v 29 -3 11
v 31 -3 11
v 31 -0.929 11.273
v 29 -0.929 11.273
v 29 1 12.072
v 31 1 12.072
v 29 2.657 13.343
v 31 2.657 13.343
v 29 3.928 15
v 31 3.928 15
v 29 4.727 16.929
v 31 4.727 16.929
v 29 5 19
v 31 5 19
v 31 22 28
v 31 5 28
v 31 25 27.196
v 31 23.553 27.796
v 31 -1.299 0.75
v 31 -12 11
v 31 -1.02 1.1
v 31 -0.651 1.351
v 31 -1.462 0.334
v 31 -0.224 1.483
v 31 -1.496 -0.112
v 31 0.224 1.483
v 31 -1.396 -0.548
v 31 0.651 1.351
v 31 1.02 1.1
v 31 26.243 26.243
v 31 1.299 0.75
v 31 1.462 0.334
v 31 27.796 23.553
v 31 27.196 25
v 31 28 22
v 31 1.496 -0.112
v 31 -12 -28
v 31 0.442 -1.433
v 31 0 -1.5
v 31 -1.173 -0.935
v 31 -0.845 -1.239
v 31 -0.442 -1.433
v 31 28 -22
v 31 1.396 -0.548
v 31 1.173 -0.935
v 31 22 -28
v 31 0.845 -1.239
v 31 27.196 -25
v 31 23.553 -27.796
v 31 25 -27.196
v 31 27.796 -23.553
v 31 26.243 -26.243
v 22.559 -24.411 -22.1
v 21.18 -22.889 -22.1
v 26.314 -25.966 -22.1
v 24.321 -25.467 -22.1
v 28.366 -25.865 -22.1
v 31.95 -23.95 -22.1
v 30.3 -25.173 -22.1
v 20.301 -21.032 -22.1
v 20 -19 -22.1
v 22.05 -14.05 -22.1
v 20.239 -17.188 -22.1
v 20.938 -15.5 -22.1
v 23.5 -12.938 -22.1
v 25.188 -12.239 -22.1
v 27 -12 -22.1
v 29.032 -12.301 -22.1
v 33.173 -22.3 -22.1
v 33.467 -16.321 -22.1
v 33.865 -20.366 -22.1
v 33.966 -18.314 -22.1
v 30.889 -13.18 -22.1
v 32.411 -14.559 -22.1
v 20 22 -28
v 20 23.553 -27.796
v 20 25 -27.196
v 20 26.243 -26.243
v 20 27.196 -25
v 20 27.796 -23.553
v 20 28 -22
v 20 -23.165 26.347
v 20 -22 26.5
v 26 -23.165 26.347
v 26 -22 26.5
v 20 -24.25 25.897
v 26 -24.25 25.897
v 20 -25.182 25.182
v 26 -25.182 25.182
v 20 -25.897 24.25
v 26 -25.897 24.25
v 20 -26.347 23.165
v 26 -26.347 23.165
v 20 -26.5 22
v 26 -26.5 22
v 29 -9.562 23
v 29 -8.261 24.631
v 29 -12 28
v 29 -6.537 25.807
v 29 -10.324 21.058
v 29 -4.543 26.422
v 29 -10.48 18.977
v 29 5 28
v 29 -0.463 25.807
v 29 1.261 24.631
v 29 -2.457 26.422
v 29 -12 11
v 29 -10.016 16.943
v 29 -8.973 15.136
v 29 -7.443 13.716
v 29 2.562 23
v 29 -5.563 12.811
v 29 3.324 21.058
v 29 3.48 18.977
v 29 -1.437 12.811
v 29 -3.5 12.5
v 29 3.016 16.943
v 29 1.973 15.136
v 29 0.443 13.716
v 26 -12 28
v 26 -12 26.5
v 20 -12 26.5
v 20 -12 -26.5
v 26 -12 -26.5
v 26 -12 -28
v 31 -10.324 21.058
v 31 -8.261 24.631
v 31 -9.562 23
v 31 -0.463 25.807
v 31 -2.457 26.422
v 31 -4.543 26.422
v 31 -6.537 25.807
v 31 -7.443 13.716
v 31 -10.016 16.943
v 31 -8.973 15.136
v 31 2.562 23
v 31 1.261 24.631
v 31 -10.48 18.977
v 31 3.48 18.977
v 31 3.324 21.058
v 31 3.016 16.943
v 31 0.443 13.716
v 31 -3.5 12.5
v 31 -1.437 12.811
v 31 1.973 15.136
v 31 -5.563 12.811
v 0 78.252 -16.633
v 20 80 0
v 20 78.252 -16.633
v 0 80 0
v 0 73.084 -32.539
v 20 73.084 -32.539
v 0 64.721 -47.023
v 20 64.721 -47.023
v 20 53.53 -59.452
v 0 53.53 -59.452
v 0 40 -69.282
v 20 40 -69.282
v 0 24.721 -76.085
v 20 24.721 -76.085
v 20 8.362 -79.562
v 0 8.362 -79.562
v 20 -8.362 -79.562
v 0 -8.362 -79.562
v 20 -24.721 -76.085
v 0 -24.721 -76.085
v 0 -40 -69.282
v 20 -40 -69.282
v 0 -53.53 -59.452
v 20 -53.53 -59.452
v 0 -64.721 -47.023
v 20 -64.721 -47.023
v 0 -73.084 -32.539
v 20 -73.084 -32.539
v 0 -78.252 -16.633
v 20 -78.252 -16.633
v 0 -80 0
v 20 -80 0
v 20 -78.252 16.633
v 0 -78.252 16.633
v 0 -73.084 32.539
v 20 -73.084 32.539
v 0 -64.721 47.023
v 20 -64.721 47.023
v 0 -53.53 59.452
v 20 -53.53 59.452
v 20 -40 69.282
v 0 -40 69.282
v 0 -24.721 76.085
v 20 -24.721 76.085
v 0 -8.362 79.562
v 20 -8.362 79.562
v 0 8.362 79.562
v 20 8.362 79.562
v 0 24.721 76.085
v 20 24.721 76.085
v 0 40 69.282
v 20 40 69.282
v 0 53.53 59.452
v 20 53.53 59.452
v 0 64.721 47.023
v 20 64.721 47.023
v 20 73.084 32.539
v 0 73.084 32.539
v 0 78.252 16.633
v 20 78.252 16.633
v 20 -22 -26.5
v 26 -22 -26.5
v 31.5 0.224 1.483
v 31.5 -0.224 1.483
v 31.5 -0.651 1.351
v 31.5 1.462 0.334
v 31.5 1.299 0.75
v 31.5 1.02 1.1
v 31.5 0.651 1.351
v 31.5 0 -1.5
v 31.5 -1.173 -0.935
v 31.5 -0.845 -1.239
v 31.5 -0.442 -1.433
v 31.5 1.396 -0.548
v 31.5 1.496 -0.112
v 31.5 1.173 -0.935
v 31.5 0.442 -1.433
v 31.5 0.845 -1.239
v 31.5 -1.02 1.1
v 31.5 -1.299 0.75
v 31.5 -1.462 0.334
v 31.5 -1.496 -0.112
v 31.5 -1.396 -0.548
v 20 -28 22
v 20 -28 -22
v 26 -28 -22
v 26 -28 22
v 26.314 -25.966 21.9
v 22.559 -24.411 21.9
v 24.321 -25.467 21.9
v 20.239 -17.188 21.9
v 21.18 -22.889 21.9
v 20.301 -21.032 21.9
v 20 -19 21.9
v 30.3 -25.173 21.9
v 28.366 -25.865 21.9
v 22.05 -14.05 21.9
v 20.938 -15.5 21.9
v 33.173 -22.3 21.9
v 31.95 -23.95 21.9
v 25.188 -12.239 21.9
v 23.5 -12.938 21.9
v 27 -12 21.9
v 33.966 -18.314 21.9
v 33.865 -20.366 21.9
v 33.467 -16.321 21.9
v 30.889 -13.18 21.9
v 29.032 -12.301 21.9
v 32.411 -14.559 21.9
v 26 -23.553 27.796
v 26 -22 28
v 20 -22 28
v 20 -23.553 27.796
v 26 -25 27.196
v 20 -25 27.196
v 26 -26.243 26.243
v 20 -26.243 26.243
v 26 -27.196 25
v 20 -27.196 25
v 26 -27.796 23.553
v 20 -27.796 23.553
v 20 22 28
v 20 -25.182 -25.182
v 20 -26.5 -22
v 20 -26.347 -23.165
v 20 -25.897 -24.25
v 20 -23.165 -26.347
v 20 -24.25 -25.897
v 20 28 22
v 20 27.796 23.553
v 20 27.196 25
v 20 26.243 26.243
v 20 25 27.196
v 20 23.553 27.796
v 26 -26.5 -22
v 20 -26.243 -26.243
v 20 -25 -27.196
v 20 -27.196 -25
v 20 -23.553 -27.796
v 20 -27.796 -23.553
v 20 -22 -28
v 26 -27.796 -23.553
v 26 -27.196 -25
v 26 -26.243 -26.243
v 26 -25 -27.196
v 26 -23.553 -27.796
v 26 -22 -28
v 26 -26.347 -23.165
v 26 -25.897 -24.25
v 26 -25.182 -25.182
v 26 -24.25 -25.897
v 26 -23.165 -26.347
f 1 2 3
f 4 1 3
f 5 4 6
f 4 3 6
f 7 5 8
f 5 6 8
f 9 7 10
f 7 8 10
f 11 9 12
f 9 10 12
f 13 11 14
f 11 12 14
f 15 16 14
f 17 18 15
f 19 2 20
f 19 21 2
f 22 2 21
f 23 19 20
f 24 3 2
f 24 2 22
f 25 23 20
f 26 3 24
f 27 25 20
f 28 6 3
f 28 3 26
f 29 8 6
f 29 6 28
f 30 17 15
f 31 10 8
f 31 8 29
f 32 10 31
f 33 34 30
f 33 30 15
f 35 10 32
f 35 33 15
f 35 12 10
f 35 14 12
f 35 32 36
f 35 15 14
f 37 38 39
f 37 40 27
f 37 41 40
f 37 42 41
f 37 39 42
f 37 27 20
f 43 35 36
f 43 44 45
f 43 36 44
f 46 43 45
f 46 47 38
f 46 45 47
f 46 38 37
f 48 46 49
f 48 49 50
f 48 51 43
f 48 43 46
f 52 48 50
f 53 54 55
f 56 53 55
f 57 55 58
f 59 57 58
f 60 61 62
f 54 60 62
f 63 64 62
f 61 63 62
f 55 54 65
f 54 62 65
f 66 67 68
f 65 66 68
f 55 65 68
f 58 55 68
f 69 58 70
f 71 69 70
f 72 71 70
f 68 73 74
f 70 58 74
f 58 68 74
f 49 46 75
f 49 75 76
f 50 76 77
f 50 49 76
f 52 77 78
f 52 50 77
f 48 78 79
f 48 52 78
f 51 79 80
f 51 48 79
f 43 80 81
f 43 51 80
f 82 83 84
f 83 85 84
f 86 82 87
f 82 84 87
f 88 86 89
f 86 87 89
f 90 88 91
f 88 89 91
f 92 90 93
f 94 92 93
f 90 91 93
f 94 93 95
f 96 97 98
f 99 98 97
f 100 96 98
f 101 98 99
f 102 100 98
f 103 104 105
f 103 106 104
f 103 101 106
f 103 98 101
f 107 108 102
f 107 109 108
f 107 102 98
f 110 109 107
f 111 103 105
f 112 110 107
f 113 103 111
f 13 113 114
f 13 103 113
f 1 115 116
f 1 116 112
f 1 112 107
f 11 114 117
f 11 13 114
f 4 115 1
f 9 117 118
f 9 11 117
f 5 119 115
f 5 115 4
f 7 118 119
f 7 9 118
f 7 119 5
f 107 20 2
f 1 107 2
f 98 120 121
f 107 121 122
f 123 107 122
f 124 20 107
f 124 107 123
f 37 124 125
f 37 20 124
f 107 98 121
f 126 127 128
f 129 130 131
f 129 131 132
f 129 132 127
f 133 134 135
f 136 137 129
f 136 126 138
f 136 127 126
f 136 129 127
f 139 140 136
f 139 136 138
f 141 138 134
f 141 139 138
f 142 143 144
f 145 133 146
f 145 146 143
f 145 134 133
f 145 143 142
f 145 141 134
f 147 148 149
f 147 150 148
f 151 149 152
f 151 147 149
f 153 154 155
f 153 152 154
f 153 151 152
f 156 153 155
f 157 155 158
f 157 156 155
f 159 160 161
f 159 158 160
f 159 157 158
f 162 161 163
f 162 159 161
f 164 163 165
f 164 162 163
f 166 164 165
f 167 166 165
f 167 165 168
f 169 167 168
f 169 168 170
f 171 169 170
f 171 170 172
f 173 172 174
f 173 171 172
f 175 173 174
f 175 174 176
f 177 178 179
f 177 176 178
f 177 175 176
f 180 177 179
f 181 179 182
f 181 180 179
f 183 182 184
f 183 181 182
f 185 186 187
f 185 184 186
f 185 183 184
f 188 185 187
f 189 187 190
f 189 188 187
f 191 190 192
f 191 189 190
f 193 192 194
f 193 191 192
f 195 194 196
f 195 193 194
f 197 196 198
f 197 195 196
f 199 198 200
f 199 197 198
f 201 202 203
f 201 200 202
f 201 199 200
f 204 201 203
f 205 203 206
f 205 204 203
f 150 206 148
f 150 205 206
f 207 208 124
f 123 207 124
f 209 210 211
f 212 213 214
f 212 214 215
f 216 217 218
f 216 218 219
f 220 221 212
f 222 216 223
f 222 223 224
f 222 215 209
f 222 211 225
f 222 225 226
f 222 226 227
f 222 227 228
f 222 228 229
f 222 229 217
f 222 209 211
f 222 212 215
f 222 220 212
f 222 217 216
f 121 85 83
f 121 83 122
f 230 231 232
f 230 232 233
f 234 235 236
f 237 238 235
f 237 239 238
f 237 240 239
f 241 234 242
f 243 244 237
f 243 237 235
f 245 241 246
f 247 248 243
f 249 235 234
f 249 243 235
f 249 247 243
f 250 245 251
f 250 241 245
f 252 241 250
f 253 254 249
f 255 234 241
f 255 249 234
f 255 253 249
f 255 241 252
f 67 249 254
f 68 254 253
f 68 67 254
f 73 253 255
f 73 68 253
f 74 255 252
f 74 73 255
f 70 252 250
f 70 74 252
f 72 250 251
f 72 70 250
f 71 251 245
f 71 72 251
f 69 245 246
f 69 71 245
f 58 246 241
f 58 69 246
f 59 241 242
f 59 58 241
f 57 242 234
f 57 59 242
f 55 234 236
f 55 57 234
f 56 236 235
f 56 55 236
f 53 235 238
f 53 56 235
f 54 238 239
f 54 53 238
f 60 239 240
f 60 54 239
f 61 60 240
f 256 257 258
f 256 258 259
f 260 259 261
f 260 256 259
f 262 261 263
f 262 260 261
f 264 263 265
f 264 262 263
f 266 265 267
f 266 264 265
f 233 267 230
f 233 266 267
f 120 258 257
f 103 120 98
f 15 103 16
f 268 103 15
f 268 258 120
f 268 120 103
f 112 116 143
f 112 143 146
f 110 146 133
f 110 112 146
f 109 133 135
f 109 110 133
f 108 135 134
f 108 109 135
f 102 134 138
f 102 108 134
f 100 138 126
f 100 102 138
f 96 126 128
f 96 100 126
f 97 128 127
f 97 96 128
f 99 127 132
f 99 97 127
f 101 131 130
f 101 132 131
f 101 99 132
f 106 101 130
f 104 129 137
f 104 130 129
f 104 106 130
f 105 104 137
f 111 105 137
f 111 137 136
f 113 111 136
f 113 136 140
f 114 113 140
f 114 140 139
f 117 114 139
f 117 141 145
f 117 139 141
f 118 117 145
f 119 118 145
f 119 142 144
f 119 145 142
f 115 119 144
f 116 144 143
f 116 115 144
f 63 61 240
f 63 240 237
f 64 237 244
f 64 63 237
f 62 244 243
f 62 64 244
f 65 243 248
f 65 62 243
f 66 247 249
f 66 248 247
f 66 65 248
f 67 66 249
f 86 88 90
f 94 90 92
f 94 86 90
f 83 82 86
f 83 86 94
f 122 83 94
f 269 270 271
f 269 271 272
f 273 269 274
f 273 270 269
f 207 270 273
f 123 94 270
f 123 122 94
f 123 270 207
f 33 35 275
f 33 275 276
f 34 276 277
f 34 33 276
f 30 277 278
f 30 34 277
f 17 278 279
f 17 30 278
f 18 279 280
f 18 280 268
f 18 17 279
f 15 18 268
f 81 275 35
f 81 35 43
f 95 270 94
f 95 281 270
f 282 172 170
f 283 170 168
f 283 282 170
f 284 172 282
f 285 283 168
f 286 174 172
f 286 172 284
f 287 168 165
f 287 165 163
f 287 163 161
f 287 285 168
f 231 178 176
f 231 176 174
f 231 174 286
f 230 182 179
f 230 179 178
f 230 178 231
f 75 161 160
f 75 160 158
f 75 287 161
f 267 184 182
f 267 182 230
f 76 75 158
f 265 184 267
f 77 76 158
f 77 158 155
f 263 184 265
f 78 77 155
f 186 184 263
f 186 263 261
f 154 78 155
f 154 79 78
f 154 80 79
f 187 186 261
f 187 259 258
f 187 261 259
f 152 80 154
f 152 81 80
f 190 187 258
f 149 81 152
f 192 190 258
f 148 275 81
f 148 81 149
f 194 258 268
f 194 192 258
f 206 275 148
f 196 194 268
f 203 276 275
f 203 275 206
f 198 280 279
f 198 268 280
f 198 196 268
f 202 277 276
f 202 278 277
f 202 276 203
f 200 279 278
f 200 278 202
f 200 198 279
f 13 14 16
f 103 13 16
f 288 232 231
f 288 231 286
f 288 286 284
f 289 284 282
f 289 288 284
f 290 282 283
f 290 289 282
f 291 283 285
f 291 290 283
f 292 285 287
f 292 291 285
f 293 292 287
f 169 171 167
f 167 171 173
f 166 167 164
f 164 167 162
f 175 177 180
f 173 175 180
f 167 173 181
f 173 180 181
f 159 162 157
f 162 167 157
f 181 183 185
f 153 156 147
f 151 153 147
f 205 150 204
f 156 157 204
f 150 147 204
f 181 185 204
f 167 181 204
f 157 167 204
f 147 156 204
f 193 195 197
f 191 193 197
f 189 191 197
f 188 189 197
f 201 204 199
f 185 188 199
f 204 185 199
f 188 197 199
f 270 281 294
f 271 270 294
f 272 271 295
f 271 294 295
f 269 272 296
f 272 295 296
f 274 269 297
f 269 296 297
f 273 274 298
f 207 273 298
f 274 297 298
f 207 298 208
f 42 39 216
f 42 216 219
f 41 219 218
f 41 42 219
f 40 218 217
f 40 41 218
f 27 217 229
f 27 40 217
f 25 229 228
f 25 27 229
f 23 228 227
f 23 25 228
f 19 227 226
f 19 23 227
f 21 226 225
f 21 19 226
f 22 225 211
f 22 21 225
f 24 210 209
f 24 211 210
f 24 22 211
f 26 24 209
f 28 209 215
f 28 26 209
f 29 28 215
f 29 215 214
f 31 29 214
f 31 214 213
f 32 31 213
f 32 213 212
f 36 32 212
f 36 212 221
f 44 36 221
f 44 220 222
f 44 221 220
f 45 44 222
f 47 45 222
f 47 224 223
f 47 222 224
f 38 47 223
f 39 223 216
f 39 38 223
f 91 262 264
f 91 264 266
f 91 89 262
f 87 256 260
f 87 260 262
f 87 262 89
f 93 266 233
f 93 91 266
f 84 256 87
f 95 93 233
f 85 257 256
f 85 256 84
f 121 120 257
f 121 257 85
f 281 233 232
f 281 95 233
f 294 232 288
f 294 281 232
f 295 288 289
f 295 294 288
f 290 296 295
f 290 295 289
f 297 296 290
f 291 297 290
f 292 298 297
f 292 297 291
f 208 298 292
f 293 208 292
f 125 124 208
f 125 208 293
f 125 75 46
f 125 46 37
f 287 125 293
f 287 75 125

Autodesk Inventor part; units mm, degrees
ref_plane "YZ Plane" through (0, 0, 0) normal (1, 0, 0) x (0, 1, 0)
ref_plane "XZ Plane" through (0, 0, 0) normal (0, 1, 0) x (-1, 0, 0)
ref_plane "XY Plane" through (0, 0, 0) normal (0, 0, 1) x (1, 0, 0)
sketch "スケッチ1" plane through (0, 0, 0) normal (1, 0, 0) x (0, 1, 0)
  circle A0 centre (0, 0) radius 80
  dimension "d0" = 160
extrude "押し出し1" add sketch "スケッチ1" along normal blind 20
sketch "スケッチ2" plane through (20, 0, 0) normal (1, 0, 0) x (0, 0, -1)
  line L0 (28, -28) -> (-28, -28)
  line L1 (-28, -28) -> (-28, 28)
  line L2 (-28, 28) -> (28, 28)
  line L3 (28, 28) -> (28, -28)
  line L4 (28, -28) -> (-28, 28) construction
  line L5 (-28, -28) -> (28, 28) construction
  point P0 (0, 0)
  dimension "d3" = 56
  dimension "d4" = 56
extrude "押し出し2" add sketch "スケッチ2" along normal blind 11
sketch "スケッチ3" plane through (31, 0, 0) normal (1, 0, 0) x (0, 0, -1)
  line L0 (28, 28) -> (-28, 28) projected
  line L1 (-28, 28) -> (-28, -28) projected
  line L2 (-28, -28) -> (28, -28) projected
  line L3 (28, -28) -> (28, 28) projected
  circle A0 centre (-22, 22) radius 6
  line L4 (0, 28) -> (0, -28)
  line L5 (-28, 0) -> (28, 0)
  circle A1 centre (22, 22) radius 6
  circle A2 centre (-22, -22) radius 6
  circle A3 centre (22, -22) radius 6
  point P0 (0, 0)
  point P1 (-22, -28)
  point P2 (-28, -22)
  point P3 (28, -22)
  point P4 (22, -28)
  point P5 (22, 28)
  point P6 (28, 22)
  point P7 (-28, 22)
  point P8 (-22, 28)
  dimension "d7" = 12
extrude "押し出し3" cut sketch "スケッチ3" against normal up to surface (11 mm away) contours L3 A1 L0 | A0 L1 L0 | L3 L2 A3 | L2 L1 A2
sketch "スケッチ4" plane through (31, 0, 0) normal (1, 0, 0) x (0, 0, -1)
  arc A0 (22, -28) -> (28, -22) centre (22, -22) ccw projected
  line L0 (28, -22) -> (28, 22) projected
  arc A1 (28, 22) -> (22, 28) centre (22, 22) ccw projected
  line L1 (22, 28) -> (-22, 28) projected
  arc A2 (-22, 28) -> (-28, 22) centre (-22, 22) ccw projected
  line L2 (-28, 22) -> (-28, -22) projected
  arc A3 (-28, -22) -> (-22, -28) centre (-22, -22) ccw projected
  line L3 (-22, -28) -> (22, -28) projected
  line L4 (-28, -12) -> (28, -12)
  point P0 (0, 0)
  dimension "d10" = 16
extrude "押し出し4" cut sketch "スケッチ4" against normal blind 5 contours L3 A3 L2 L4 L0 A0
sketch "スケッチ5" plane through (26, 0, 0) normal (1, 0, 0) x (0, 0, -1)
  line L0 (28, -12) -> (28, -22) projected
  line L1 (-28, -12) -> (28, -12) projected
  line L2 (-28, -22) -> (-28, -12) projected
  arc A0 (-28, -22) -> (-22, -28) centre (-22, -22) ccw projected
  line L3 (22, -28) -> (-22, -28) projected
  arc A1 (22, -28) -> (28, -22) centre (22, -22) ccw projected
  arc A2 (-26.5, -22) -> (-22, -26.5) centre (-22, -22) ccw
  line L4 (-26.5, -22) -> (-26.5, -13.5)
  line L5 (-26.5, -13.5) -> (26.5, -13.5)
  line L6 (26.5, -13.5) -> (26.5, -22)
  arc A3 (22, -26.5) -> (26.5, -22) centre (22, -22) ccw
  line L7 (22, -26.5) -> (-22, -26.5)
  line L8 (-26.5, -13.5) -> (-26.5, -12)
  line L9 (26.5, -13.5) -> (26.5, -12)
  point P0 (0, 0)
  dimension "d13" = 1.5
extrude "押し出し5" cut sketch "スケッチ5" against normal up to surface (6 mm away) contours L9 L5 L8 L1 | L6 A3 L7 A2 L4 L5
ref_plane "作業平面1" through (26, -22, -22.1) normal (0, 0, 1) x (1, 0, 0)
sketch "スケッチ6" plane through (26, -22, -22.1) normal (0, 0, 1) x (1, 0, 0)
  line L0 (0, 10) -> (-6, 10) projected
  line L1 (0, 10) -> (5, 10) projected
  line L2 (-6, -58) -> (-6, 102) projected
  circle A0 centre (1, 3) radius 7
  point P0 (-26, 22)
  dimension "d17" = 14
extrude "押し出し6" add sketch "スケッチ6" along normal blind 44 contours A0
sketch "スケッチ7" plane through (31, 0, 0) normal (1, 0, 0) x (0, 0, -1)
  line L0 (-28, -12) -> (28, -12) projected
  line L1 (28, -12) -> (28, 22) projected
  arc A0 (28, 22) -> (22, 28) centre (22, 22) ccw projected
  line L2 (22, 28) -> (-22, 28) projected
  arc A1 (-22, 28) -> (-28, 22) centre (-22, 22) ccw projected
  line L3 (-28, 22) -> (-28, -12) projected
  line L4 (-28, -12) -> (-11, -12)
  line L5 (-11, -12) -> (-11, 5)
  line L6 (-11, 5) -> (-28, 5)
  line L7 (-28, 5) -> (-28, -12)
  circle A2 centre (-19, -3) radius 8
  point P0 (0, 0)
  point P1 (-19, 5)
  point P2 (-11, -3)
  dimension "d20" = 17
  dimension "d21" = 17
  dimension "d22" = 16
extrude "押し出し7" cut sketch "スケッチ7" against normal blind 2 contours L3 L6 A2 L5 L0 | A2
sketch "スケッチ8" plane through (29, 0, 0) normal (1, 0, 0) x (0, 0, -1)
  line L0 (-28, -12) -> (-28, 5) projected
  line L1 (-11, -12) -> (-28, -12) projected
  line L2 (-11, -3) -> (-11, -12) projected
  arc A0 (-11, -3) -> (-19, 5) centre (-19, -3) ccw projected
  line L3 (-28, 5) -> (-19, 5) projected
  circle A1 centre (-19.5, -3.5) radius 7
  point P0 (0, 0)
  dimension "d25" = 14
  dimension "d26" = 8.5
  dimension "d27" = 8.5
extrude "押し出し8" add sketch "スケッチ8" along normal blind 2 contours A1
sketch "スケッチ9" plane through (31, 0, 0) normal (1, 0, 0) x (0, 0, -1)
  circle A0 centre (0, 0) radius 1.5
  dimension "d30" = 3
extrude "押し出し9" add sketch "スケッチ9" along normal blind 0.5
properties part number "Clack"
